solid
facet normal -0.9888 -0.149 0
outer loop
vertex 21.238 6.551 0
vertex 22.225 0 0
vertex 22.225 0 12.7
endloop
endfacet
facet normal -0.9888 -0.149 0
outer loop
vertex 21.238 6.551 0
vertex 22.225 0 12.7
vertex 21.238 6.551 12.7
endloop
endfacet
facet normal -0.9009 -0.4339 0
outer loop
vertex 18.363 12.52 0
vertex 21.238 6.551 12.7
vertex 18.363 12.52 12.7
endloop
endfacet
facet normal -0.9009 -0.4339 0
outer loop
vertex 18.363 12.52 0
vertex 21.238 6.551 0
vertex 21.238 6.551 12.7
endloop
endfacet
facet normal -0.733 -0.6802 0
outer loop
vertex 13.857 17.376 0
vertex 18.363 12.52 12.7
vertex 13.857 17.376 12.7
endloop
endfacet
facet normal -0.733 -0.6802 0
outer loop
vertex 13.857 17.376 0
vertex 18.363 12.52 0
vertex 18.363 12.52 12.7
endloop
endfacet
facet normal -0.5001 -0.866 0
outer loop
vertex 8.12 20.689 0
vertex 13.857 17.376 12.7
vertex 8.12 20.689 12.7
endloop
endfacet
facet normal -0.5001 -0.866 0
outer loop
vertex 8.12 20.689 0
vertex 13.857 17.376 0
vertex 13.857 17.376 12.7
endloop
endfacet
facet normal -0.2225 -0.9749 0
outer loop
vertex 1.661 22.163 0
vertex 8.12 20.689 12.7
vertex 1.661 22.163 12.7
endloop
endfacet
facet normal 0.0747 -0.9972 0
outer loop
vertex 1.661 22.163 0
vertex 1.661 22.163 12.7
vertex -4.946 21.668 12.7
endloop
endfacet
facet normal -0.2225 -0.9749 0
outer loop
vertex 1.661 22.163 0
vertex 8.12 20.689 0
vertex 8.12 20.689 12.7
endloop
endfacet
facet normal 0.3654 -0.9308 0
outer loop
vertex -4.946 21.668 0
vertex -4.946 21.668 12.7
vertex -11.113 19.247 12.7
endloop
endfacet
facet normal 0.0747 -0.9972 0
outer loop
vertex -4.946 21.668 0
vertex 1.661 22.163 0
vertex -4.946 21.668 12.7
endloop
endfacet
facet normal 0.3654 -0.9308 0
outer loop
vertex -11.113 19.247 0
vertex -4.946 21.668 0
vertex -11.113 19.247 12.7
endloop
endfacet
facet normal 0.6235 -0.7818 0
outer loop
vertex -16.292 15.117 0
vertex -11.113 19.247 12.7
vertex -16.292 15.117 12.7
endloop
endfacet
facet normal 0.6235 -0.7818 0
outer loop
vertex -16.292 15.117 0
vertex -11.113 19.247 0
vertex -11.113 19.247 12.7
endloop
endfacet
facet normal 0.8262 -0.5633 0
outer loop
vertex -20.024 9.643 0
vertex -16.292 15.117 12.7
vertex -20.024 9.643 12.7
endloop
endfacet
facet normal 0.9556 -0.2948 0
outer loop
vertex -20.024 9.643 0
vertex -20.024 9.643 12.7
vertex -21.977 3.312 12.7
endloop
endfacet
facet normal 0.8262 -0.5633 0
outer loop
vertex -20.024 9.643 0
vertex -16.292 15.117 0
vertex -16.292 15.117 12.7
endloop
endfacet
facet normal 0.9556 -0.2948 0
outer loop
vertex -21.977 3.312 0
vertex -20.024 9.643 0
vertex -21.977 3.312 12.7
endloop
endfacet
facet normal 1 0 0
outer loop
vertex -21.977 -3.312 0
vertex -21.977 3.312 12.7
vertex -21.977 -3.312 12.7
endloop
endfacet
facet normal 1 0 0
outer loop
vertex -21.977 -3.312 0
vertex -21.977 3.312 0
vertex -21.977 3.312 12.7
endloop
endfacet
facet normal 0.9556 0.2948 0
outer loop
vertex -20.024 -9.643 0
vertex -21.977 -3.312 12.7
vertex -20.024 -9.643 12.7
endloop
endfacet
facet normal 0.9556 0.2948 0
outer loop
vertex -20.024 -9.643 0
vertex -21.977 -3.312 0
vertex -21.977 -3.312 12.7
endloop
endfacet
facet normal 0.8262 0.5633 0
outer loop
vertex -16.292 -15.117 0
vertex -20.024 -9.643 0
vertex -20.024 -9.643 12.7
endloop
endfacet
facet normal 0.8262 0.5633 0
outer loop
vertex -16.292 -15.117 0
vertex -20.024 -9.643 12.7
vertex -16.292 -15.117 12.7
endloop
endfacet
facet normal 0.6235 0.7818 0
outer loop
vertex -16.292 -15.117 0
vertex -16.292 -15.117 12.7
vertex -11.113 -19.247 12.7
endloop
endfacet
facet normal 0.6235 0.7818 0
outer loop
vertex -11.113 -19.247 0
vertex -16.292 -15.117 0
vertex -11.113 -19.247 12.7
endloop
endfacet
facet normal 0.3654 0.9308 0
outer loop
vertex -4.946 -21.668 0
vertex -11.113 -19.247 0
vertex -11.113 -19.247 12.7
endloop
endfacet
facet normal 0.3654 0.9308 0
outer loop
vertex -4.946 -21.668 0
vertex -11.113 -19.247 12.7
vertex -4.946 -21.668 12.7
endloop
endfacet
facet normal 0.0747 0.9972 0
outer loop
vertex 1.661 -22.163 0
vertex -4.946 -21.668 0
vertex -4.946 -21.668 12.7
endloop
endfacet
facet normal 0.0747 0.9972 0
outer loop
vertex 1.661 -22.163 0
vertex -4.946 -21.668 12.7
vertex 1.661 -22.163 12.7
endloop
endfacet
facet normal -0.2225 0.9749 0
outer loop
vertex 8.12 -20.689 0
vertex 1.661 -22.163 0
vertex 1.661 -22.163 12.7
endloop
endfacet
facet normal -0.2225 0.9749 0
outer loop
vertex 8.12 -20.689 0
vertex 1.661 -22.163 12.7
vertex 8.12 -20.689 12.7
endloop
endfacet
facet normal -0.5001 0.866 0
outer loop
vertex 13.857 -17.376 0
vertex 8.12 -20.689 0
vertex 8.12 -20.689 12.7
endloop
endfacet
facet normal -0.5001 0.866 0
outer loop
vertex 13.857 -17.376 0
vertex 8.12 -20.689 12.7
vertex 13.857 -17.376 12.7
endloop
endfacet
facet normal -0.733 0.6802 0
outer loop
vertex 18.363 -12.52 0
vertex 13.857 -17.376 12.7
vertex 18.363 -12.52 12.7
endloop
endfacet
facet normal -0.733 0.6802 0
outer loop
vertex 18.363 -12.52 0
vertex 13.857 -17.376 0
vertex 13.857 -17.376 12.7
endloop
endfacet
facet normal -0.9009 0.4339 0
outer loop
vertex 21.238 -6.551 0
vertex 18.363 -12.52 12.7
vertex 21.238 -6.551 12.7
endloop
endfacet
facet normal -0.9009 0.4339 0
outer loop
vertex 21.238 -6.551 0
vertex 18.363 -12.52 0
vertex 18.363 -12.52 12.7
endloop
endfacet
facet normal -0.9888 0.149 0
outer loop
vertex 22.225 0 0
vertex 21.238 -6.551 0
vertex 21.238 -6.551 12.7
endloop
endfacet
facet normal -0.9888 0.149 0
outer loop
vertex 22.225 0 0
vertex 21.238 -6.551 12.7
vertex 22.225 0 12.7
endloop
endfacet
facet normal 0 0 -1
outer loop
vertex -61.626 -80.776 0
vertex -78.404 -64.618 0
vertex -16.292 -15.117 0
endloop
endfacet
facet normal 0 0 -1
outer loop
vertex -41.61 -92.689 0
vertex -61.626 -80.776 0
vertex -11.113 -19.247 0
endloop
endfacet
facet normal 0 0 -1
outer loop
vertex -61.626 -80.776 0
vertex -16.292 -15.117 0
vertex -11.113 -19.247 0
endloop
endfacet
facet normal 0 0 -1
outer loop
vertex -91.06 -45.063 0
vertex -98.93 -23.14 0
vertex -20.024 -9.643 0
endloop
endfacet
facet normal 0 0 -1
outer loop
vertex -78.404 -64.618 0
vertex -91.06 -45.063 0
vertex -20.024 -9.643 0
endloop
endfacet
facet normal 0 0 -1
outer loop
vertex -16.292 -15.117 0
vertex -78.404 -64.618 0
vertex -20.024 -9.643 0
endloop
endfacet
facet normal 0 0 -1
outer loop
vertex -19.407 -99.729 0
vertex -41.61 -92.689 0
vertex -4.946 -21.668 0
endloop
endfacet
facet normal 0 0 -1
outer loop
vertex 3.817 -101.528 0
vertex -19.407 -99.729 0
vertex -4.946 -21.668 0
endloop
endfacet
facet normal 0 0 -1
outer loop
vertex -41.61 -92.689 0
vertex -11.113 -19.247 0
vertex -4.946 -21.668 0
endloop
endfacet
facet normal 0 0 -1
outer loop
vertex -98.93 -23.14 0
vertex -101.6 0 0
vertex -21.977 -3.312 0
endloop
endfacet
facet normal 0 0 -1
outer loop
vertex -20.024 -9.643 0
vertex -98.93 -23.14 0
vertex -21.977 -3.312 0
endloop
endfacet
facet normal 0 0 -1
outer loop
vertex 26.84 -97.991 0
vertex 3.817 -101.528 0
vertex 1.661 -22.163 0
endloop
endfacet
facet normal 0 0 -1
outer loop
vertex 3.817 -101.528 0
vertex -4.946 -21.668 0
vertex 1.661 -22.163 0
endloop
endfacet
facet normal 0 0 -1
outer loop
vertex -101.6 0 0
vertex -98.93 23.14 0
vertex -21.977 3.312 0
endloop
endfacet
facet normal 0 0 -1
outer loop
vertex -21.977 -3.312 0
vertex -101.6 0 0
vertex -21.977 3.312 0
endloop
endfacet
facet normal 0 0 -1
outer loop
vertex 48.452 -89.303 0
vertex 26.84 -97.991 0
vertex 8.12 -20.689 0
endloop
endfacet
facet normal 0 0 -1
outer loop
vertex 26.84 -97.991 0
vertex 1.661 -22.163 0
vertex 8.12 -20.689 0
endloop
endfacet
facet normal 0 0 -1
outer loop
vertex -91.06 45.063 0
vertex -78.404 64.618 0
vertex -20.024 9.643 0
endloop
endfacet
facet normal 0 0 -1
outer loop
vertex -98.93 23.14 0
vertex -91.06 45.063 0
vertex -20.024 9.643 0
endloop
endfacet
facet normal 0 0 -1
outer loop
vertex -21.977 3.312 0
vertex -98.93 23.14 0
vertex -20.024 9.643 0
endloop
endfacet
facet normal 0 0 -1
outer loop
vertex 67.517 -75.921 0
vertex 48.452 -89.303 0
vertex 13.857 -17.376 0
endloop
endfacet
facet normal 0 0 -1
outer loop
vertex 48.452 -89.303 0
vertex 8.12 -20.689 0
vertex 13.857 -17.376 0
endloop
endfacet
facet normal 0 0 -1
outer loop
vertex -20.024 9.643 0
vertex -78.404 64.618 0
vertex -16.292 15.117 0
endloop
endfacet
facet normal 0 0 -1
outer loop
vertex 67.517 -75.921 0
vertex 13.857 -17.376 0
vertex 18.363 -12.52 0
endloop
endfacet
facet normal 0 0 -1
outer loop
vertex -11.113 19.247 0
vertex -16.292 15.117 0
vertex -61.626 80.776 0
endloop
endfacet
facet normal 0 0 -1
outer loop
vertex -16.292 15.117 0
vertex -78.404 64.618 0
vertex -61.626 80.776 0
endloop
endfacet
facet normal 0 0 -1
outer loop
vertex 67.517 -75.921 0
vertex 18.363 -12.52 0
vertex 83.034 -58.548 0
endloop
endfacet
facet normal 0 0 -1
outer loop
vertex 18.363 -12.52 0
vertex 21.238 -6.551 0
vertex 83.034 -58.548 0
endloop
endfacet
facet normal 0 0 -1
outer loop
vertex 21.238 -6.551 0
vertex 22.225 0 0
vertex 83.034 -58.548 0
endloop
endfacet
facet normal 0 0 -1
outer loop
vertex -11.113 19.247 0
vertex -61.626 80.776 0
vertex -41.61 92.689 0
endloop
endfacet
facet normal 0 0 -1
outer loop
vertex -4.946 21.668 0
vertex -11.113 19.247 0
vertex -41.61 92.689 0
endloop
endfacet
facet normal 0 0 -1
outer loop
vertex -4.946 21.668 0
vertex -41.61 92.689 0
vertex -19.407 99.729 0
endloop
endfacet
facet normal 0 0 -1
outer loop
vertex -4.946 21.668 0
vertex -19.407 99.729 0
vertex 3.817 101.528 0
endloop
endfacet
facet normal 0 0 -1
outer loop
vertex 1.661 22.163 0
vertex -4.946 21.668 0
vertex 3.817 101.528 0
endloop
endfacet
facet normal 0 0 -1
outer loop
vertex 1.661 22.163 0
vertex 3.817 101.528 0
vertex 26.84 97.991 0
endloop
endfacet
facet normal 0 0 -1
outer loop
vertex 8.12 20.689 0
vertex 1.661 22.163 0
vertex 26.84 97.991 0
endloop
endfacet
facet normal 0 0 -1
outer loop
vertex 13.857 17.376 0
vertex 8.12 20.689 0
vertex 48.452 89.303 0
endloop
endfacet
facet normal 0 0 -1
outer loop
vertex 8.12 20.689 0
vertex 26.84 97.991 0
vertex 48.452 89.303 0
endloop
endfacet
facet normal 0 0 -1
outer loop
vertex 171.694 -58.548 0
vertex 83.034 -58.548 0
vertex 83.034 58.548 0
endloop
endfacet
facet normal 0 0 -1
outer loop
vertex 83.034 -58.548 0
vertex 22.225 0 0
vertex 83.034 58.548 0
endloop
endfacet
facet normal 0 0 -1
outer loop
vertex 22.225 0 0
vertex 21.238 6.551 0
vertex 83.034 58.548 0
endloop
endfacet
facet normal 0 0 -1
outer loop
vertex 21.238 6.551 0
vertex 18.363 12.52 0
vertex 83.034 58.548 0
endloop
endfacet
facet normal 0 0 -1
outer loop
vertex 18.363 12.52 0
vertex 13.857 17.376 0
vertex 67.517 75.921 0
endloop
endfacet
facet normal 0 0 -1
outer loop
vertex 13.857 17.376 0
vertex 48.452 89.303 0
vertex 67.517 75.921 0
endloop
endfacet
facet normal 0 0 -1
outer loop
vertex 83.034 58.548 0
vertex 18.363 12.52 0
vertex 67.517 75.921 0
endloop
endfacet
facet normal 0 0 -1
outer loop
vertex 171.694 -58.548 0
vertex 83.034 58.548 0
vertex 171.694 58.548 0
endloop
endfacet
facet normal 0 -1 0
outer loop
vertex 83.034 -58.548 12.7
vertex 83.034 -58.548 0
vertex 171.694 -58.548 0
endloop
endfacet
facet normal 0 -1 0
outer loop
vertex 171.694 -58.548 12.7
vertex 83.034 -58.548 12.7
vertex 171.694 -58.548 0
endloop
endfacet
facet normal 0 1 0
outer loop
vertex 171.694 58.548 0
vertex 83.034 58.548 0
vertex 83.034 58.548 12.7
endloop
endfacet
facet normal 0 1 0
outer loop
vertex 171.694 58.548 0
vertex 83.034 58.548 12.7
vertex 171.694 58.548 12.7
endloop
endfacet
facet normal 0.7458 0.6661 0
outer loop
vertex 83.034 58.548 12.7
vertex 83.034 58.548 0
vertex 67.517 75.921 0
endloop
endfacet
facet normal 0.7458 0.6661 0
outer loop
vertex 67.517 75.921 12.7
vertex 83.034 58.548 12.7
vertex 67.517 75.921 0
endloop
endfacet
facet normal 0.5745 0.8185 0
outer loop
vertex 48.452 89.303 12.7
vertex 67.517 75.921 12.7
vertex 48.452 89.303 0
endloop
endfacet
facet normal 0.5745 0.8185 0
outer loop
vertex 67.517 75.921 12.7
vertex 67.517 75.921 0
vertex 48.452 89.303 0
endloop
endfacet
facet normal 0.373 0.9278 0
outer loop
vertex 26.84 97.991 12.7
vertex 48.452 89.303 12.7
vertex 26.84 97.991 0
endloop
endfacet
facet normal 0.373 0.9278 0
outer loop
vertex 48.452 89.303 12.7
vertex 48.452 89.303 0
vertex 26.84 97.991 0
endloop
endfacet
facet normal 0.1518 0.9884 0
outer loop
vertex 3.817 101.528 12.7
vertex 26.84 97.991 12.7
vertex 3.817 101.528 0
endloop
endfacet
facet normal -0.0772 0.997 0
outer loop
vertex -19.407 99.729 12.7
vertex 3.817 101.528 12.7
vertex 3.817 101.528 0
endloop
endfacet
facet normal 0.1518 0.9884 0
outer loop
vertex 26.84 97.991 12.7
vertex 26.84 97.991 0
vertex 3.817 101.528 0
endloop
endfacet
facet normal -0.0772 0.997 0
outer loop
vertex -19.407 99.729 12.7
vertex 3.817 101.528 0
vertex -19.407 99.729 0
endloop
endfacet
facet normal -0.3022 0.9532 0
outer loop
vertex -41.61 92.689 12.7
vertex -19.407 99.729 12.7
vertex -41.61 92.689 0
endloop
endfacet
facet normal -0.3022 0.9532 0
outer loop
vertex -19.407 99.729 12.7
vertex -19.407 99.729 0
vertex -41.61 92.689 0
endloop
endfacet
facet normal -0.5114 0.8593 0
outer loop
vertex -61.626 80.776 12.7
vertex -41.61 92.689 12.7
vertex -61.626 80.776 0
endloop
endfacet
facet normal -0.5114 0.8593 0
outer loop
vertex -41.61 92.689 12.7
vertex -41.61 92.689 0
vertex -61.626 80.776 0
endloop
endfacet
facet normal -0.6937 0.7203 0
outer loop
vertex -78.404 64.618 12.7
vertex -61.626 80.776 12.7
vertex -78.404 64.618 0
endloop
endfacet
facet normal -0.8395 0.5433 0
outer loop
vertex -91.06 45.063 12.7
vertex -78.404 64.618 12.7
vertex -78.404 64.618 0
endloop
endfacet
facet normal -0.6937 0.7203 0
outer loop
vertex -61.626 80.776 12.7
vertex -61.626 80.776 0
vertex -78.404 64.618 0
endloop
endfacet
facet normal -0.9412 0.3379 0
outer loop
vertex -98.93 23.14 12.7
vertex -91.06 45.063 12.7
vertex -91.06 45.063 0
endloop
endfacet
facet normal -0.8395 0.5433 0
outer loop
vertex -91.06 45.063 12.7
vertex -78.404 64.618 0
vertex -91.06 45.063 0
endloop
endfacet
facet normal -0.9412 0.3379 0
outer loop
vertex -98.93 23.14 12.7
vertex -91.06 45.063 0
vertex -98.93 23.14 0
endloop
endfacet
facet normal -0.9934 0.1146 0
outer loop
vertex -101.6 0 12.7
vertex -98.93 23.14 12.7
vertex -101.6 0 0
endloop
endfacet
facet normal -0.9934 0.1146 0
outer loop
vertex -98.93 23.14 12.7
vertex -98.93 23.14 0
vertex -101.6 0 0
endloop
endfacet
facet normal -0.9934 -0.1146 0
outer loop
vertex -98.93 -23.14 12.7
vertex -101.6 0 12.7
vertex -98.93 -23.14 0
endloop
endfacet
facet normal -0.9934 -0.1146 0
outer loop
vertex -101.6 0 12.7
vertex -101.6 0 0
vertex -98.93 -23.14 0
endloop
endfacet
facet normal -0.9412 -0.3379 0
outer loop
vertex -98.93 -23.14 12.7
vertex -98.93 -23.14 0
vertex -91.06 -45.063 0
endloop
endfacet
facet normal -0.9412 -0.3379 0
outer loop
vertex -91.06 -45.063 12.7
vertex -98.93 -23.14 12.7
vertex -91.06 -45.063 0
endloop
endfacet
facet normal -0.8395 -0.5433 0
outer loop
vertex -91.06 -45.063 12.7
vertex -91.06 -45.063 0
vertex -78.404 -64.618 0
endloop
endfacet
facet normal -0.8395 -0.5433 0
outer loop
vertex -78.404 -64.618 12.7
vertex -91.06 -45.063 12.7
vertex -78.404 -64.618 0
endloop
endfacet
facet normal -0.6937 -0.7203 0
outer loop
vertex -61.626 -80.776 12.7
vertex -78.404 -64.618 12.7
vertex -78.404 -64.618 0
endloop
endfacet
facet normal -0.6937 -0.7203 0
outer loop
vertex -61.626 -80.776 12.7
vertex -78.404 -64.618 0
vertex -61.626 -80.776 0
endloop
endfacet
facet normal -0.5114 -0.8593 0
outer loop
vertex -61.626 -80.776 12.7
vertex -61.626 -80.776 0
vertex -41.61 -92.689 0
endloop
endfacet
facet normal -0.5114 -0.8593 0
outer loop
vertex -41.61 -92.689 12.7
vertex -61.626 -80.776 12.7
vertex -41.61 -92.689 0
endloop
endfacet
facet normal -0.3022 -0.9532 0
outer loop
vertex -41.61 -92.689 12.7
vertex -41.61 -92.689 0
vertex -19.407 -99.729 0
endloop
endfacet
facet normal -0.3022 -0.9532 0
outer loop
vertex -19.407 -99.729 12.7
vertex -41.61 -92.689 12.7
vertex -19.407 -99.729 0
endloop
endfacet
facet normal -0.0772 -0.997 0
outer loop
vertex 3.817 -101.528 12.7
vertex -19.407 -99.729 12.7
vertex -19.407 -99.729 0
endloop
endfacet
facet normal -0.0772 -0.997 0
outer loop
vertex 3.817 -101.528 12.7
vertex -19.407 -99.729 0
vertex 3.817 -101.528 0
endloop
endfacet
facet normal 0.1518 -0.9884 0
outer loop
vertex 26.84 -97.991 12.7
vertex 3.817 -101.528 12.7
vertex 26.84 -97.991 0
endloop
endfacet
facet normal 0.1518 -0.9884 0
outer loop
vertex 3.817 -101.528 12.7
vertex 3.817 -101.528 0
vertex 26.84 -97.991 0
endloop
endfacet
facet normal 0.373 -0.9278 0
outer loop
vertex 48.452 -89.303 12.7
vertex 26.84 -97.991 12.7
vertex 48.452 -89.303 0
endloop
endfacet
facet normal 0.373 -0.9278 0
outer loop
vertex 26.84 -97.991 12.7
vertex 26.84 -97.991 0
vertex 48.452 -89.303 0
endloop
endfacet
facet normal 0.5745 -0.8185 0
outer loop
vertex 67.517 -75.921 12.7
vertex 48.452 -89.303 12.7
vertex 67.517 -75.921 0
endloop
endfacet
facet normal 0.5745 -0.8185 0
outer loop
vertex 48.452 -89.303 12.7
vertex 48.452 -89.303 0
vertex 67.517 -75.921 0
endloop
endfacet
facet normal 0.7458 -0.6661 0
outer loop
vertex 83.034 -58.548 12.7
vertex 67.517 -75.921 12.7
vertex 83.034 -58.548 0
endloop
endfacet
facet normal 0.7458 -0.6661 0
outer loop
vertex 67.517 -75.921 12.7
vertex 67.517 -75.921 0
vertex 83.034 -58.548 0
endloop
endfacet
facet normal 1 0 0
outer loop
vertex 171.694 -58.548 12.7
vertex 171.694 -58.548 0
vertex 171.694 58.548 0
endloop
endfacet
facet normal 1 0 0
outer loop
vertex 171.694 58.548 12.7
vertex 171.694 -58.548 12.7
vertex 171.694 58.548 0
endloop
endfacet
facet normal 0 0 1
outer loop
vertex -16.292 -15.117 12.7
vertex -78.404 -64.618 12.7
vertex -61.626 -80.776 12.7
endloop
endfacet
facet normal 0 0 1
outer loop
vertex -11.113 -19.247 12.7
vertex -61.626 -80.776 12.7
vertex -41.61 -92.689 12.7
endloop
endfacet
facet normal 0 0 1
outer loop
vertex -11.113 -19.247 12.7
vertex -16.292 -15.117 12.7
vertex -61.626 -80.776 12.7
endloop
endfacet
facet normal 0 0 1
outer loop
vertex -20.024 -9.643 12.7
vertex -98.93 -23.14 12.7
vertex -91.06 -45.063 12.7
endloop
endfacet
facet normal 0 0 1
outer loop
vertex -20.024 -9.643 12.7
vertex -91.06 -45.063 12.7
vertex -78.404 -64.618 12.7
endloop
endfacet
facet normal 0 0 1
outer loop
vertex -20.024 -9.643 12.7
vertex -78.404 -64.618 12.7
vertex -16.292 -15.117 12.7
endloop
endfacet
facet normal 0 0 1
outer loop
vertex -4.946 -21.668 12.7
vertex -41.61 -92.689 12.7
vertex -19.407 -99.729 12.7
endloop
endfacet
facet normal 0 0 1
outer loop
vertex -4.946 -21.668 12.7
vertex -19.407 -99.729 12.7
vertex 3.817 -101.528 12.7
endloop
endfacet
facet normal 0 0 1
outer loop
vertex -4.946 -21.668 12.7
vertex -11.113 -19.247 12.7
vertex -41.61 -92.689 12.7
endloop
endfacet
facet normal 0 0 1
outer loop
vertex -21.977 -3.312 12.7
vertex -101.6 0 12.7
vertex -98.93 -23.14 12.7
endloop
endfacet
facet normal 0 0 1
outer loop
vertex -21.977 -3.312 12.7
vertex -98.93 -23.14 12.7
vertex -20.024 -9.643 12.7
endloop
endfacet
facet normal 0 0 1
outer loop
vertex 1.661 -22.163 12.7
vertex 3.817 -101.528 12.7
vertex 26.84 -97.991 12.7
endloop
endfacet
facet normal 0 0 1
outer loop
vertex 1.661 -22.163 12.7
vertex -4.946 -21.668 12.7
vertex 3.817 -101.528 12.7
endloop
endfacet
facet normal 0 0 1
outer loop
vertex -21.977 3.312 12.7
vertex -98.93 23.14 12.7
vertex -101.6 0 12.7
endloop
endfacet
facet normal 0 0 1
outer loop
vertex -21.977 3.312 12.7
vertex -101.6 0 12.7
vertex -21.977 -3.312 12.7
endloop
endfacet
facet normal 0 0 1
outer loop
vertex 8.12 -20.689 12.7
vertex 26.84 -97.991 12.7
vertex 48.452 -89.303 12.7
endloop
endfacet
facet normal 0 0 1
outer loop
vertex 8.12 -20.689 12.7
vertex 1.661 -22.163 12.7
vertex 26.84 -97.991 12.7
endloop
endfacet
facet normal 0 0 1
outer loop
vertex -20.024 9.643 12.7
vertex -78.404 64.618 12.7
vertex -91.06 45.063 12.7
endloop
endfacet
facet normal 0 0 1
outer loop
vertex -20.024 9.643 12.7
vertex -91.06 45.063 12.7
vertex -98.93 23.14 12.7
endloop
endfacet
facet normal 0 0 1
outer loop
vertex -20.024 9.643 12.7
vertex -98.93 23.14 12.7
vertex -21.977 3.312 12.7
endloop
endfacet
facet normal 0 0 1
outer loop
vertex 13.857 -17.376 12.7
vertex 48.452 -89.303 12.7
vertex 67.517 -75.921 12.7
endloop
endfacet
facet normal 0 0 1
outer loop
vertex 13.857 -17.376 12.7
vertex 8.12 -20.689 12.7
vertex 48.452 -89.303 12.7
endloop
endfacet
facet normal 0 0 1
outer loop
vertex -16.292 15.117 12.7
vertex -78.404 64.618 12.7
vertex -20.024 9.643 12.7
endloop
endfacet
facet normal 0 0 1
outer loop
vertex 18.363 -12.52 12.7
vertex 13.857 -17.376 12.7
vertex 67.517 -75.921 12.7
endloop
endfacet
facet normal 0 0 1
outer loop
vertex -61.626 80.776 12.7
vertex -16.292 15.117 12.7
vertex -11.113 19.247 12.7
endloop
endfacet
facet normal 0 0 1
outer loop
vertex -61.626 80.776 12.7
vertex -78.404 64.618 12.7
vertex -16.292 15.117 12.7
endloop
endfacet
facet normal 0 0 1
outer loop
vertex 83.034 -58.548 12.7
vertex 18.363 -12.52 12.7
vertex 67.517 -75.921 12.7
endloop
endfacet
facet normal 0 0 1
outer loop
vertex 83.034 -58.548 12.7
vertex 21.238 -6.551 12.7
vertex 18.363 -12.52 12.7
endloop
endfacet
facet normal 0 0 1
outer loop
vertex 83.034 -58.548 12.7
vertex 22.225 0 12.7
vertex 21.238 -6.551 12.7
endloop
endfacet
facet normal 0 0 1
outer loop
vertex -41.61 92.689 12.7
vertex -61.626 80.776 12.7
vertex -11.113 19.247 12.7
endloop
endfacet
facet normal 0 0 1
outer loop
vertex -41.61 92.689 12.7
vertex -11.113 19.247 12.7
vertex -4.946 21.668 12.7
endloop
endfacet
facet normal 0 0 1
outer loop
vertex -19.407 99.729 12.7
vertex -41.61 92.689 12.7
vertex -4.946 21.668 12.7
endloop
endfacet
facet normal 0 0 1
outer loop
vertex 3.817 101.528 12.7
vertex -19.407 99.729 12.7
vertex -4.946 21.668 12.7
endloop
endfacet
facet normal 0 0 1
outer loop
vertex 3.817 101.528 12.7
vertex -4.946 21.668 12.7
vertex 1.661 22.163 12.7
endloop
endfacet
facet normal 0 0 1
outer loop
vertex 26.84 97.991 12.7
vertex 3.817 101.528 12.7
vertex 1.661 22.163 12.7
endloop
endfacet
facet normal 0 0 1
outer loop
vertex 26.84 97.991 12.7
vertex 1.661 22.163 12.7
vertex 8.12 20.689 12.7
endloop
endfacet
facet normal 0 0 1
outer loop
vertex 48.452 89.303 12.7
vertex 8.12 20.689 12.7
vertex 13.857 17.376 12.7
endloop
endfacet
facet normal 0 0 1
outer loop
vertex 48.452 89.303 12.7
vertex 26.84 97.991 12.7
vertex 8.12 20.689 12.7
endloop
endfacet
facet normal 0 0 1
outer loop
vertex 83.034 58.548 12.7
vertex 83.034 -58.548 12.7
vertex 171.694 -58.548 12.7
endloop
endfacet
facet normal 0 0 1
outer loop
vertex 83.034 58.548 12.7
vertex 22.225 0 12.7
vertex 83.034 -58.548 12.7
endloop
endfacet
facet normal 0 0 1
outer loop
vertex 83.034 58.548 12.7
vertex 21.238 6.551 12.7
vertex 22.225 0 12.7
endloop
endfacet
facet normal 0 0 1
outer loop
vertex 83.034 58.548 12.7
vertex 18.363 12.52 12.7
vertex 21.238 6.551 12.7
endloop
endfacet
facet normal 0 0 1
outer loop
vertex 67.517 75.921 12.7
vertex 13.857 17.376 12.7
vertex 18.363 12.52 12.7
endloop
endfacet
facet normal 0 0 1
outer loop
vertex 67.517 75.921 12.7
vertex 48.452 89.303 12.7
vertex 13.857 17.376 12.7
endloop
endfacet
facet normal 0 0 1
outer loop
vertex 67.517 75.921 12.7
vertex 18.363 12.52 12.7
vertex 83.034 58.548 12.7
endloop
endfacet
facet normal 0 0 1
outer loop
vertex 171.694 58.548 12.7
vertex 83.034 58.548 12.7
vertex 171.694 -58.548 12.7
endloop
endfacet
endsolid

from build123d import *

# Parameters (mm, degrees)
SKETCH1_R           = 101.6
SKETCH1_R_2         = 22.225
SKETCH1_W           = 88.659510459
SKETCH1_H           = 117.09666856
BOSS_EXTRUDE1_DEPTH = 12.7


with BuildPart() as part:
    # Sketch1 → Boss-Extrude1 (new body)
    with BuildSketch(Plane.XY):
        Circle(SKETCH1_R)
        Circle(SKETCH1_R_2, mode=Mode.SUBTRACT)
        with Locations((127.363799772, 0)):
            Rectangle(SKETCH1_W, SKETCH1_H)
    extrude(amount=BOSS_EXTRUDE1_DEPTH)


solid = part.part
